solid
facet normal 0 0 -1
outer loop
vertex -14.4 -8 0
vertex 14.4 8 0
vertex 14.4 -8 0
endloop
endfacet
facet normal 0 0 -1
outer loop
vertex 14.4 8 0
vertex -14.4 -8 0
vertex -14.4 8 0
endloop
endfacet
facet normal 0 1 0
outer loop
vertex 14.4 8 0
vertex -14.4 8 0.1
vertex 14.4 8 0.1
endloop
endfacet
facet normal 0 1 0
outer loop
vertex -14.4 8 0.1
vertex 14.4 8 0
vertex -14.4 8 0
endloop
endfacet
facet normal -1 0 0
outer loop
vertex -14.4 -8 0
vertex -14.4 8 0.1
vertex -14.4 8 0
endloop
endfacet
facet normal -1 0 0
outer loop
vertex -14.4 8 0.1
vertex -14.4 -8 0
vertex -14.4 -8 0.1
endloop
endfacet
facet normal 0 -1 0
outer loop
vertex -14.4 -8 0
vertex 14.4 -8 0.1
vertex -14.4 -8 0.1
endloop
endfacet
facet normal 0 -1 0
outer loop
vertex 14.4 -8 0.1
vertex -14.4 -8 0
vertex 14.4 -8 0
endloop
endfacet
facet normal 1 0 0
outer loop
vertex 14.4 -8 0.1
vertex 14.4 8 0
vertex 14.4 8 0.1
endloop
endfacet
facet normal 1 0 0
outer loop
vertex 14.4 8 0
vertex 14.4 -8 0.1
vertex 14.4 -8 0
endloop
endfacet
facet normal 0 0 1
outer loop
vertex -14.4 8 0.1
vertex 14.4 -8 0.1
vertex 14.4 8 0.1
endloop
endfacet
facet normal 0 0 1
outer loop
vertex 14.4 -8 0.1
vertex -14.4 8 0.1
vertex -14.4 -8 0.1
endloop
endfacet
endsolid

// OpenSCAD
// file: ../p/box5-12.scad
use <../lib.scad>
function ldraw_lib__box5_12() = [
// 0 Box with 5 Faces without Any Edges
// 0 Name: box5-12.dat
// 0 Author: Chris Dee [cwdee]
// 0 !LDRAW_ORG Primitive UPDATE 2009-02
// 0 !LICENSE Licensed under CC BY 4.0 : see CAreadme.txt
// 
// 0 BFC CERTIFY CCW
  [0,"BFC","CERTIFY"],
  [0,"BFC","CCW"],
// 
// 0 !HISTORY 2009-09-03 [PTadmin] Official Update 2009-02
// 
// 
// 4 16 1 1 1 1 1 -1 -1 1 -1 -1 1 1
  [4,16,1,1,1,1,1,-1,-1,1,-1,-1,1,1],
// 4 16 -1 0 1 1 0 1 1 1 1 -1 1 1
  [4,16,-1,0,1,1,0,1,1,1,1,-1,1,1],
// 4 16 -1 0 -1 -1 0 1 -1 1 1 -1 1 -1
  [4,16,-1,0,-1,-1,0,1,-1,1,1,-1,1,-1],
// 4 16 1 0 -1 -1 0 -1 -1 1 -1 1 1 -1
  [4,16,1,0,-1,-1,0,-1,-1,1,-1,1,1,-1],
// 4 16 1 0 1 1 0 -1 1 1 -1 1 1 1
  [4,16,1,0,1,1,0,-1,1,1,-1,1,1,1],
// 0
];
module ldraw_lib__box5_12(step=0, col=false, unit=2/5, alt=false, line=0.2, solid=!$preview)
    makepoly(ldraw_lib__box5_12(), step=step, col=col, unit=unit, alt=alt, line=line, solid=solid);
ldraw_lib__box5_12(line=0.2);
// main file
use <../lib.scad>
use <../p/box5-12.scad>
function ldraw_lib__192685c() = [
// 0 Sticker  2 x  3.6 Black
// 0 Name: 192685c.dat
// 0 Author: Rene Rechthaler [Blechtaler]
// 0 !LDRAW_ORG Part UPDATE 2024-03
// 0 !LICENSE Licensed under CC BY 4.0 : see CAreadme.txt
// 
// 0 BFC CERTIFY CCW
  [0,"BFC","CERTIFY"],
  [0,"BFC","CCW"],
// 
// 0 !KEYWORDS Bricklink 1581.1stk01, Brickowl 382188, Ferries
// 0 !KEYWORDS Finland Steamship Co., promotional, Rebrickable 192685, Set 1581-1
// 0 !KEYWORDS Silja, Silja Line Ferry, Universal Building Set
// 
// 0 !HISTORY 2024-04-18 [MagFors] Adapted to 3 bricks height
// 0 !HISTORY 2024-04-28 [OrionP] Official Update 2024-03
// 
// 1 16 0 -.25 0 36 0 0 0 .25 0 0 0 20 box5-12.dat
  [1,16,0,-.25,0,36,0,0,0,.25,0,0,0,20, ldraw_lib__box5_12()],
// 4 0 -36 -.25 20 -36 -.25 -20 36 -.25 -20 36 -.25 20
  [4,0,-36,-.25,20,-36,-.25,-20,36,-.25,-20,36,-.25,20],
];
module ldraw_lib__192685c(step=0, col=false, unit=2/5, alt=false, line=0.2, solid=!$preview)
    makepoly(ldraw_lib__192685c(), step=step, col=col, unit=unit, alt=alt, line=line, solid=solid);
ldraw_lib__192685c(line=0.2);
